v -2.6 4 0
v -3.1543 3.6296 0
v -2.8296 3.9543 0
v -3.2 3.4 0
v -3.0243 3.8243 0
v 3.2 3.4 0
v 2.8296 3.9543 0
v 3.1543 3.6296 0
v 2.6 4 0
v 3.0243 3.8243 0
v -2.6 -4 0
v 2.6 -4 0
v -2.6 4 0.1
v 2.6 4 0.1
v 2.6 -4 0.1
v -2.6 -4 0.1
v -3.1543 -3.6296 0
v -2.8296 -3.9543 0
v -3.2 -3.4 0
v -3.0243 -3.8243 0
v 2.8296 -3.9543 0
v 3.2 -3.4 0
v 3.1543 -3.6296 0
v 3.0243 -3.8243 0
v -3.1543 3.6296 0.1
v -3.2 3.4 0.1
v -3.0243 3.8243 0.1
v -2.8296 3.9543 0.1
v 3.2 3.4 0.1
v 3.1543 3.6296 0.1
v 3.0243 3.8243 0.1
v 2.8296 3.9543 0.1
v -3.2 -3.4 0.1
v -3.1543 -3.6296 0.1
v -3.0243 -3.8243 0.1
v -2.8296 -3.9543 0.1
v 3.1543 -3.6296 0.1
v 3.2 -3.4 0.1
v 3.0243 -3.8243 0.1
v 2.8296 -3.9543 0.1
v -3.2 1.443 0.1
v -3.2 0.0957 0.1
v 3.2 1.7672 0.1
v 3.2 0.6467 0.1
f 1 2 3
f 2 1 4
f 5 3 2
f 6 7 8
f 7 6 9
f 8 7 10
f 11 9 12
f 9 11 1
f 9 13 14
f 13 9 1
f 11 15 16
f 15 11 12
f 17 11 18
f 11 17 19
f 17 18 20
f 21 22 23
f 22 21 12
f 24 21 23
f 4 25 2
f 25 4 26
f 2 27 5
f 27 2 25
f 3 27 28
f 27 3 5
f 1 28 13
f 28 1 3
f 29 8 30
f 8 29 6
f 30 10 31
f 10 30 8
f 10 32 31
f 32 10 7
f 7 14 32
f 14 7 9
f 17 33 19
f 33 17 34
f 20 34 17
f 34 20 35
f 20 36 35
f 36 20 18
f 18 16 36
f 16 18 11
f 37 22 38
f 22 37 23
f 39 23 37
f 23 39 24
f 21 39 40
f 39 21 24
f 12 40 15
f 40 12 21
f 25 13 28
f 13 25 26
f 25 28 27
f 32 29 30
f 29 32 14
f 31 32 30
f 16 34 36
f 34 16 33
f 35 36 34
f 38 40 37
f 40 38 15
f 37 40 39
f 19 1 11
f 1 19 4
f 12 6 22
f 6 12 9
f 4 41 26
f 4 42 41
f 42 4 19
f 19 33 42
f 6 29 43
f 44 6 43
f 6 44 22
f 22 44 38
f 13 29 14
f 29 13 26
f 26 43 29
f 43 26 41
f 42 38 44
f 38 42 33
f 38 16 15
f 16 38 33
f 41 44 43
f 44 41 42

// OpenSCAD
// file: ../p/box3u12.scad
use <../lib.scad>
function ldraw_lib__box3u12() = [
// 0 Box with 3 Parallel Faces without Any Edges
// 0 Name: box3u12.dat
// 0 Author: J.C. Tchang [tchang]
// 0 !LDRAW_ORG Primitive UPDATE 2014-02
// 0 !LICENSE Licensed under CC BY 4.0 : see CAreadme.txt
// 
// 0 BFC CERTIFY CCW
  [0,"BFC","CERTIFY"],
  [0,"BFC","CCW"],
// 
// 0 !HISTORY 2014-12-23 [PTadmin] Official Update 2014-02
// 
// 
// 4 16 -1 1 1 1 1 1 1 1 -1 -1 1 -1
  [4,16,-1,1,1,1,1,1,1,1,-1,-1,1,-1],
// 4 16 -1 1 1 -1 0 1 1 0 1 1 1 1
  [4,16,-1,1,1,-1,0,1,1,0,1,1,1,1],
// 4 16 1 1 -1 1 0 -1 -1 0 -1 -1 1 -1
  [4,16,1,1,-1,1,0,-1,-1,0,-1,-1,1,-1],
];
module ldraw_lib__box3u12(step=0, col=false, unit=2/5, alt=false, line=0.2, solid=!$preview)
    makepoly(ldraw_lib__box3u12(), step=step, col=col, unit=unit, alt=alt, line=line, solid=solid);
ldraw_lib__box3u12(line=0.2);
// file: ../p/1-4cyli.scad
use <../lib.scad>
function ldraw_lib__1_4cyli() = [
// 0 Cylinder 0.25
// 0 Name: 1-4cyli.dat
// 0 Author: James Jessiman
// 0 !LDRAW_ORG Primitive UPDATE 2012-01
// 0 !LICENSE Licensed under CC BY 4.0 : see CAreadme.txt
// 
// 0 BFC CERTIFY CCW
  [0,"BFC","CERTIFY"],
  [0,"BFC","CCW"],
// 
// 0 !HISTORY 2002-03-23 [sbliss] Added BFC statement.
// 0 !HISTORY 2002-04-25 [PTadmin] Official Update 2002-02
// 0 !HISTORY 2007-06-22 [PTadmin] Header formatted for Contributor Agreement
// 0 !HISTORY 2008-07-01 [PTadmin] Official Update 2008-01
// 0 !HISTORY 2012-02-16 [Philo] Changed to CCW
// 0 !HISTORY 2012-03-30 [PTadmin] Official Update 2012-01
// 
// 
// 4 16 1 1 0 0.9239 1 0.3827 0.9239 0 0.3827 1 0 0
  [4,16,1,1,0,0.9239,1,0.3827,0.9239,0,0.3827,1,0,0],
// 5 24 1 0 0 1 1 0 0.9239 0 0.3827 1 0 -1
  [5,24,1,0,0,1,1,0,0.9239,0,0.3827,1,0,-1],
// 4 16 0.9239 1 0.3827 0.7071 1 0.7071 0.7071 0 0.7071 0.9239 0 0.3827
  [4,16,0.9239,1,0.3827,0.7071,1,0.7071,0.7071,0,0.7071,0.9239,0,0.3827],
// 5 24 0.9239 0 0.3827 0.9239 1 0.3827 0.7071 0 0.7071 1 0 0
  [5,24,0.9239,0,0.3827,0.9239,1,0.3827,0.7071,0,0.7071,1,0,0],
// 4 16 0.7071 1 0.7071 0.3827 1 0.9239 0.3827 0 0.9239 0.7071 0 0.7071
  [4,16,0.7071,1,0.7071,0.3827,1,0.9239,0.3827,0,0.9239,0.7071,0,0.7071],
// 5 24 0.7071 0 0.7071 0.7071 1 0.7071 0.3827 0 0.9239 0.9239 0 0.3827
  [5,24,0.7071,0,0.7071,0.7071,1,0.7071,0.3827,0,0.9239,0.9239,0,0.3827],
// 4 16 0.3827 1 0.9239 0 1 1 0 0 1 0.3827 0 0.9239
  [4,16,0.3827,1,0.9239,0,1,1,0,0,1,0.3827,0,0.9239],
// 5 24 0.3827 0 0.9239 0.3827 1 0.9239 0 0 1 0.7071 0 0.7071
  [5,24,0.3827,0,0.9239,0.3827,1,0.9239,0,0,1,0.7071,0,0.7071],
// 5 24 0 0 1 0 1 1 0.3827 0 0.9239 -1 0 1
  [5,24,0,0,1,0,1,1,0.3827,0,0.9239,-1,0,1],
];
module ldraw_lib__1_4cyli(step=0, col=false, unit=2/5, alt=false, line=0.2, solid=!$preview)
    makepoly(ldraw_lib__1_4cyli(), step=step, col=col, unit=unit, alt=alt, line=line, solid=solid);
ldraw_lib__1_4cyli(line=0.2);
// file: ../p/1-4chrd.scad
use <../lib.scad>
function ldraw_lib__1_4chrd() = [
// 0 Chord 0.25
// 0 Name: 1-4chrd.dat
// 0 Author: Max Martin Richter [MMR1988]
// 0 !LDRAW_ORG Primitive UPDATE 2023-05
// 0 !LICENSE Licensed under CC BY 4.0 : see CAreadme.txt
// 
// 0 BFC CERTIFY CCW
  [0,"BFC","CERTIFY"],
  [0,"BFC","CCW"],
// 
// 0 !HISTORY 2004-04-22 [PTadmin] Official Update 2004-02
// 0 !HISTORY 2007-10-09 [PTadmin] Header formatted for Contributor Agreement
// 0 !HISTORY 2008-07-01 [PTadmin] Official Update 2008-01
// 0 !HISTORY 2012-08-02 [MMR1988] Re-creation with PrimGen2 and Rectifier
// 0 !HISTORY 2012-08-09 [PTadmin] Official Update 2012-02
// 0 !HISTORY 2023-10-27 [OrionP] Change author to MMR1988 from hafhead
// 0 !HISTORY 2023-10-31 [OrionP] Official Update 2023-05
// 
// 4 16 0.9239 0 0.3827 0.3827 0 0.9239 0 0 1 1 0 0
  [4,16,0.9239,0,0.3827,0.3827,0,0.9239,0,0,1,1,0,0],
// 3 16 0.7071 0 0.7071 0.3827 0 0.9239 0.9239 0 0.3827
  [3,16,0.7071,0,0.7071,0.3827,0,0.9239,0.9239,0,0.3827],
];
module ldraw_lib__1_4chrd(step=0, col=false, unit=2/5, alt=false, line=0.2, solid=!$preview)
    makepoly(ldraw_lib__1_4chrd(), step=step, col=col, unit=unit, alt=alt, line=line, solid=solid);
ldraw_lib__1_4chrd(line=0.2);
// main file
use <../lib.scad>
use <../p/1-4chrd.scad>
use <../p/1-4cyli.scad>
use <../p/box3u12.scad>
function ldraw_lib__6148328z() = [
// 0 Sticker  1.0 x  0.8 with White Stripe on Red Background Left
// 0 Name: 6148328z.dat
// 0 Author: Massimo Maso [Sirio]
// 0 !LDRAW_ORG Part UPDATE 2024-05
// 0 !LICENSE Licensed under CC BY 4.0 : see CAreadme.txt
// 
// 0 BFC CERTIFY CCW
  [0,"BFC","CERTIFY"],
  [0,"BFC","CCW"],
// 
// 0 !KEYWORDS 917K, Bricklink 75876stk01, Brickowl 852010, Pit Lane, Porsche
// 0 !KEYWORDS Rebrickable 26357, set 75876, Speed Champions
// 
// 0 !HISTORY 2024-06-30 [OrionP] Official Update 2024-05
// 
// 
// 0 // Primitives
// 
// 1 16 -6.5 0 8.5 -1.5 0 0 0 -1 0 0 0 1.5 1-4chrd.dat
  [1,16,-6.5,0,8.5,-1.5,0,0,0,-1,0,0,0,1.5, ldraw_lib__1_4chrd()],
// 1 16 6.5 0 8.5 1.5 0 0 0 -1 0 0 0 1.5 1-4chrd.dat
  [1,16,6.5,0,8.5,1.5,0,0,0,-1,0,0,0,1.5, ldraw_lib__1_4chrd()],
// 1 16 0 -.25 0 6.5 0 0 0 .25 0 0 0 10 box3u12.dat
  [1,16,0,-.25,0,6.5,0,0,0,.25,0,0,0,10, ldraw_lib__box3u12()],
// 1 16 -6.5 0 -8.5 -1.5 0 0 0 -1 0 0 0 -1.5 1-4chrd.dat
  [1,16,-6.5,0,-8.5,-1.5,0,0,0,-1,0,0,0,-1.5, ldraw_lib__1_4chrd()],
// 1 16 6.5 0 -8.5 1.5 0 0 0 -1 0 0 0 -1.5 1-4chrd.dat
  [1,16,6.5,0,-8.5,1.5,0,0,0,-1,0,0,0,-1.5, ldraw_lib__1_4chrd()],
// 1 16 -6.5 0 8.5 -1.5 0 0 0 -.25 0 0 0 1.5 1-4cyli.dat
  [1,16,-6.5,0,8.5,-1.5,0,0,0,-.25,0,0,0,1.5, ldraw_lib__1_4cyli()],
// 1 16 6.5 0 8.5 1.5 0 0 0 -.25 0 0 0 1.5 1-4cyli.dat
  [1,16,6.5,0,8.5,1.5,0,0,0,-.25,0,0,0,1.5, ldraw_lib__1_4cyli()],
// 1 16 -6.5 0 -8.5 -1.5 0 0 0 -.25 0 0 0 -1.5 1-4cyli.dat
  [1,16,-6.5,0,-8.5,-1.5,0,0,0,-.25,0,0,0,-1.5, ldraw_lib__1_4cyli()],
// 1 16 6.5 0 -8.5 1.5 0 0 0 -.25 0 0 0 -1.5 1-4cyli.dat
  [1,16,6.5,0,-8.5,1.5,0,0,0,-.25,0,0,0,-1.5, ldraw_lib__1_4cyli()],
// 1 4 -6.5 -.25 8.5 -1.5 0 0 0 1 0 0 0 1.5 1-4chrd.dat
  [1,4,-6.5,-.25,8.5,-1.5,0,0,0,1,0,0,0,1.5, ldraw_lib__1_4chrd()],
// 1 4 6.5 -.25 8.5 1.5 0 0 0 1 0 0 0 1.5 1-4chrd.dat
  [1,4,6.5,-.25,8.5,1.5,0,0,0,1,0,0,0,1.5, ldraw_lib__1_4chrd()],
// 1 4 -6.5 -.25 -8.5 -1.5 0 0 0 1 0 0 0 -1.5 1-4chrd.dat
  [1,4,-6.5,-.25,-8.5,-1.5,0,0,0,1,0,0,0,-1.5, ldraw_lib__1_4chrd()],
// 1 4 6.5 -.25 -8.5 1.5 0 0 0 1 0 0 0 -1.5 1-4chrd.dat
  [1,4,6.5,-.25,-8.5,1.5,0,0,0,1,0,0,0,-1.5, ldraw_lib__1_4chrd()],
// 0 // Bottom faces
// 4 16 -6.5 0 10 -6.5 0 -10 -8 0 -8.5 -8 0 8.5
  [4,16,-6.5,0,10,-6.5,0,-10,-8,0,-8.5,-8,0,8.5],
// 4 16 6.5 0 10 8 0 8.5 8 0 -8.5 6.5 0 -10
  [4,16,6.5,0,10,8,0,8.5,8,0,-8.5,6.5,0,-10],
// 0 // Lateral faces
// 3 16 -8 0 8.5 -8 -.25 3.6076 -8 -.25 8.5
  [3,16,-8,0,8.5,-8,-.25,3.6076,-8,-.25,8.5],
// 4 16 -8 0 8.5 -8 0 -8.5 -8 -.25 .2392 -8 -.25 3.6076
  [4,16,-8,0,8.5,-8,0,-8.5,-8,-.25,.2392,-8,-.25,3.6076],
// 3 16 -8 0 -8.5 -8 -.25 -8.5 -8 -.25 .2392
  [3,16,-8,0,-8.5,-8,-.25,-8.5,-8,-.25,.2392],
// 3 16 8 0 8.5 8 -.25 8.5 8 -.25 4.4179
  [3,16,8,0,8.5,8,-.25,8.5,8,-.25,4.4179],
// 4 16 8 0 8.5 8 -.25 4.4179 8 -.25 1.6167 8 0 -8.5
  [4,16,8,0,8.5,8,-.25,4.4179,8,-.25,1.6167,8,0,-8.5],
// 3 16 8 0 -8.5 8 -.25 1.6167 8 -.25 -8.5
  [3,16,8,0,-8.5,8,-.25,1.6167,8,-.25,-8.5],
// 0 // Top faces
// 0 // Red faces
// 4 4 -8 -.25 8.5 8 -.25 8.5 6.5 -.25 10 -6.5 -.25 10
  [4,4,-8,-.25,8.5,8,-.25,8.5,6.5,-.25,10,-6.5,-.25,10],
// 4 4 -8 -.25 8.5 -8 -.25 3.6076 8 -.25 4.4179 8 -.25 8.5
  [4,4,-8,-.25,8.5,-8,-.25,3.6076,8,-.25,4.4179,8,-.25,8.5],
// 4 4 -8 -.25 -8.5 8 -.25 -8.5 8 -.25 1.6167 -8 -.25 .2392
  [4,4,-8,-.25,-8.5,8,-.25,-8.5,8,-.25,1.6167,-8,-.25,.2392],
// 4 4 -8 -.25 -8.5 -6.5 -.25 -10 6.5 -.25 -10 8 -.25 -8.5
  [4,4,-8,-.25,-8.5,-6.5,-.25,-10,6.5,-.25,-10,8,-.25,-8.5],
// 0 // White face
// 4 15 -8 -.25 3.6076 -8 -.25 .2392 8 -.25 1.6167 8 -.25 4.4179
  [4,15,-8,-.25,3.6076,-8,-.25,.2392,8,-.25,1.6167,8,-.25,4.4179],
];
module ldraw_lib__6148328z(step=0, col=false, unit=2/5, alt=false, line=0.2, solid=!$preview)
    makepoly(ldraw_lib__6148328z(), step=step, col=col, unit=unit, alt=alt, line=line, solid=solid);
ldraw_lib__6148328z(line=0.2);
